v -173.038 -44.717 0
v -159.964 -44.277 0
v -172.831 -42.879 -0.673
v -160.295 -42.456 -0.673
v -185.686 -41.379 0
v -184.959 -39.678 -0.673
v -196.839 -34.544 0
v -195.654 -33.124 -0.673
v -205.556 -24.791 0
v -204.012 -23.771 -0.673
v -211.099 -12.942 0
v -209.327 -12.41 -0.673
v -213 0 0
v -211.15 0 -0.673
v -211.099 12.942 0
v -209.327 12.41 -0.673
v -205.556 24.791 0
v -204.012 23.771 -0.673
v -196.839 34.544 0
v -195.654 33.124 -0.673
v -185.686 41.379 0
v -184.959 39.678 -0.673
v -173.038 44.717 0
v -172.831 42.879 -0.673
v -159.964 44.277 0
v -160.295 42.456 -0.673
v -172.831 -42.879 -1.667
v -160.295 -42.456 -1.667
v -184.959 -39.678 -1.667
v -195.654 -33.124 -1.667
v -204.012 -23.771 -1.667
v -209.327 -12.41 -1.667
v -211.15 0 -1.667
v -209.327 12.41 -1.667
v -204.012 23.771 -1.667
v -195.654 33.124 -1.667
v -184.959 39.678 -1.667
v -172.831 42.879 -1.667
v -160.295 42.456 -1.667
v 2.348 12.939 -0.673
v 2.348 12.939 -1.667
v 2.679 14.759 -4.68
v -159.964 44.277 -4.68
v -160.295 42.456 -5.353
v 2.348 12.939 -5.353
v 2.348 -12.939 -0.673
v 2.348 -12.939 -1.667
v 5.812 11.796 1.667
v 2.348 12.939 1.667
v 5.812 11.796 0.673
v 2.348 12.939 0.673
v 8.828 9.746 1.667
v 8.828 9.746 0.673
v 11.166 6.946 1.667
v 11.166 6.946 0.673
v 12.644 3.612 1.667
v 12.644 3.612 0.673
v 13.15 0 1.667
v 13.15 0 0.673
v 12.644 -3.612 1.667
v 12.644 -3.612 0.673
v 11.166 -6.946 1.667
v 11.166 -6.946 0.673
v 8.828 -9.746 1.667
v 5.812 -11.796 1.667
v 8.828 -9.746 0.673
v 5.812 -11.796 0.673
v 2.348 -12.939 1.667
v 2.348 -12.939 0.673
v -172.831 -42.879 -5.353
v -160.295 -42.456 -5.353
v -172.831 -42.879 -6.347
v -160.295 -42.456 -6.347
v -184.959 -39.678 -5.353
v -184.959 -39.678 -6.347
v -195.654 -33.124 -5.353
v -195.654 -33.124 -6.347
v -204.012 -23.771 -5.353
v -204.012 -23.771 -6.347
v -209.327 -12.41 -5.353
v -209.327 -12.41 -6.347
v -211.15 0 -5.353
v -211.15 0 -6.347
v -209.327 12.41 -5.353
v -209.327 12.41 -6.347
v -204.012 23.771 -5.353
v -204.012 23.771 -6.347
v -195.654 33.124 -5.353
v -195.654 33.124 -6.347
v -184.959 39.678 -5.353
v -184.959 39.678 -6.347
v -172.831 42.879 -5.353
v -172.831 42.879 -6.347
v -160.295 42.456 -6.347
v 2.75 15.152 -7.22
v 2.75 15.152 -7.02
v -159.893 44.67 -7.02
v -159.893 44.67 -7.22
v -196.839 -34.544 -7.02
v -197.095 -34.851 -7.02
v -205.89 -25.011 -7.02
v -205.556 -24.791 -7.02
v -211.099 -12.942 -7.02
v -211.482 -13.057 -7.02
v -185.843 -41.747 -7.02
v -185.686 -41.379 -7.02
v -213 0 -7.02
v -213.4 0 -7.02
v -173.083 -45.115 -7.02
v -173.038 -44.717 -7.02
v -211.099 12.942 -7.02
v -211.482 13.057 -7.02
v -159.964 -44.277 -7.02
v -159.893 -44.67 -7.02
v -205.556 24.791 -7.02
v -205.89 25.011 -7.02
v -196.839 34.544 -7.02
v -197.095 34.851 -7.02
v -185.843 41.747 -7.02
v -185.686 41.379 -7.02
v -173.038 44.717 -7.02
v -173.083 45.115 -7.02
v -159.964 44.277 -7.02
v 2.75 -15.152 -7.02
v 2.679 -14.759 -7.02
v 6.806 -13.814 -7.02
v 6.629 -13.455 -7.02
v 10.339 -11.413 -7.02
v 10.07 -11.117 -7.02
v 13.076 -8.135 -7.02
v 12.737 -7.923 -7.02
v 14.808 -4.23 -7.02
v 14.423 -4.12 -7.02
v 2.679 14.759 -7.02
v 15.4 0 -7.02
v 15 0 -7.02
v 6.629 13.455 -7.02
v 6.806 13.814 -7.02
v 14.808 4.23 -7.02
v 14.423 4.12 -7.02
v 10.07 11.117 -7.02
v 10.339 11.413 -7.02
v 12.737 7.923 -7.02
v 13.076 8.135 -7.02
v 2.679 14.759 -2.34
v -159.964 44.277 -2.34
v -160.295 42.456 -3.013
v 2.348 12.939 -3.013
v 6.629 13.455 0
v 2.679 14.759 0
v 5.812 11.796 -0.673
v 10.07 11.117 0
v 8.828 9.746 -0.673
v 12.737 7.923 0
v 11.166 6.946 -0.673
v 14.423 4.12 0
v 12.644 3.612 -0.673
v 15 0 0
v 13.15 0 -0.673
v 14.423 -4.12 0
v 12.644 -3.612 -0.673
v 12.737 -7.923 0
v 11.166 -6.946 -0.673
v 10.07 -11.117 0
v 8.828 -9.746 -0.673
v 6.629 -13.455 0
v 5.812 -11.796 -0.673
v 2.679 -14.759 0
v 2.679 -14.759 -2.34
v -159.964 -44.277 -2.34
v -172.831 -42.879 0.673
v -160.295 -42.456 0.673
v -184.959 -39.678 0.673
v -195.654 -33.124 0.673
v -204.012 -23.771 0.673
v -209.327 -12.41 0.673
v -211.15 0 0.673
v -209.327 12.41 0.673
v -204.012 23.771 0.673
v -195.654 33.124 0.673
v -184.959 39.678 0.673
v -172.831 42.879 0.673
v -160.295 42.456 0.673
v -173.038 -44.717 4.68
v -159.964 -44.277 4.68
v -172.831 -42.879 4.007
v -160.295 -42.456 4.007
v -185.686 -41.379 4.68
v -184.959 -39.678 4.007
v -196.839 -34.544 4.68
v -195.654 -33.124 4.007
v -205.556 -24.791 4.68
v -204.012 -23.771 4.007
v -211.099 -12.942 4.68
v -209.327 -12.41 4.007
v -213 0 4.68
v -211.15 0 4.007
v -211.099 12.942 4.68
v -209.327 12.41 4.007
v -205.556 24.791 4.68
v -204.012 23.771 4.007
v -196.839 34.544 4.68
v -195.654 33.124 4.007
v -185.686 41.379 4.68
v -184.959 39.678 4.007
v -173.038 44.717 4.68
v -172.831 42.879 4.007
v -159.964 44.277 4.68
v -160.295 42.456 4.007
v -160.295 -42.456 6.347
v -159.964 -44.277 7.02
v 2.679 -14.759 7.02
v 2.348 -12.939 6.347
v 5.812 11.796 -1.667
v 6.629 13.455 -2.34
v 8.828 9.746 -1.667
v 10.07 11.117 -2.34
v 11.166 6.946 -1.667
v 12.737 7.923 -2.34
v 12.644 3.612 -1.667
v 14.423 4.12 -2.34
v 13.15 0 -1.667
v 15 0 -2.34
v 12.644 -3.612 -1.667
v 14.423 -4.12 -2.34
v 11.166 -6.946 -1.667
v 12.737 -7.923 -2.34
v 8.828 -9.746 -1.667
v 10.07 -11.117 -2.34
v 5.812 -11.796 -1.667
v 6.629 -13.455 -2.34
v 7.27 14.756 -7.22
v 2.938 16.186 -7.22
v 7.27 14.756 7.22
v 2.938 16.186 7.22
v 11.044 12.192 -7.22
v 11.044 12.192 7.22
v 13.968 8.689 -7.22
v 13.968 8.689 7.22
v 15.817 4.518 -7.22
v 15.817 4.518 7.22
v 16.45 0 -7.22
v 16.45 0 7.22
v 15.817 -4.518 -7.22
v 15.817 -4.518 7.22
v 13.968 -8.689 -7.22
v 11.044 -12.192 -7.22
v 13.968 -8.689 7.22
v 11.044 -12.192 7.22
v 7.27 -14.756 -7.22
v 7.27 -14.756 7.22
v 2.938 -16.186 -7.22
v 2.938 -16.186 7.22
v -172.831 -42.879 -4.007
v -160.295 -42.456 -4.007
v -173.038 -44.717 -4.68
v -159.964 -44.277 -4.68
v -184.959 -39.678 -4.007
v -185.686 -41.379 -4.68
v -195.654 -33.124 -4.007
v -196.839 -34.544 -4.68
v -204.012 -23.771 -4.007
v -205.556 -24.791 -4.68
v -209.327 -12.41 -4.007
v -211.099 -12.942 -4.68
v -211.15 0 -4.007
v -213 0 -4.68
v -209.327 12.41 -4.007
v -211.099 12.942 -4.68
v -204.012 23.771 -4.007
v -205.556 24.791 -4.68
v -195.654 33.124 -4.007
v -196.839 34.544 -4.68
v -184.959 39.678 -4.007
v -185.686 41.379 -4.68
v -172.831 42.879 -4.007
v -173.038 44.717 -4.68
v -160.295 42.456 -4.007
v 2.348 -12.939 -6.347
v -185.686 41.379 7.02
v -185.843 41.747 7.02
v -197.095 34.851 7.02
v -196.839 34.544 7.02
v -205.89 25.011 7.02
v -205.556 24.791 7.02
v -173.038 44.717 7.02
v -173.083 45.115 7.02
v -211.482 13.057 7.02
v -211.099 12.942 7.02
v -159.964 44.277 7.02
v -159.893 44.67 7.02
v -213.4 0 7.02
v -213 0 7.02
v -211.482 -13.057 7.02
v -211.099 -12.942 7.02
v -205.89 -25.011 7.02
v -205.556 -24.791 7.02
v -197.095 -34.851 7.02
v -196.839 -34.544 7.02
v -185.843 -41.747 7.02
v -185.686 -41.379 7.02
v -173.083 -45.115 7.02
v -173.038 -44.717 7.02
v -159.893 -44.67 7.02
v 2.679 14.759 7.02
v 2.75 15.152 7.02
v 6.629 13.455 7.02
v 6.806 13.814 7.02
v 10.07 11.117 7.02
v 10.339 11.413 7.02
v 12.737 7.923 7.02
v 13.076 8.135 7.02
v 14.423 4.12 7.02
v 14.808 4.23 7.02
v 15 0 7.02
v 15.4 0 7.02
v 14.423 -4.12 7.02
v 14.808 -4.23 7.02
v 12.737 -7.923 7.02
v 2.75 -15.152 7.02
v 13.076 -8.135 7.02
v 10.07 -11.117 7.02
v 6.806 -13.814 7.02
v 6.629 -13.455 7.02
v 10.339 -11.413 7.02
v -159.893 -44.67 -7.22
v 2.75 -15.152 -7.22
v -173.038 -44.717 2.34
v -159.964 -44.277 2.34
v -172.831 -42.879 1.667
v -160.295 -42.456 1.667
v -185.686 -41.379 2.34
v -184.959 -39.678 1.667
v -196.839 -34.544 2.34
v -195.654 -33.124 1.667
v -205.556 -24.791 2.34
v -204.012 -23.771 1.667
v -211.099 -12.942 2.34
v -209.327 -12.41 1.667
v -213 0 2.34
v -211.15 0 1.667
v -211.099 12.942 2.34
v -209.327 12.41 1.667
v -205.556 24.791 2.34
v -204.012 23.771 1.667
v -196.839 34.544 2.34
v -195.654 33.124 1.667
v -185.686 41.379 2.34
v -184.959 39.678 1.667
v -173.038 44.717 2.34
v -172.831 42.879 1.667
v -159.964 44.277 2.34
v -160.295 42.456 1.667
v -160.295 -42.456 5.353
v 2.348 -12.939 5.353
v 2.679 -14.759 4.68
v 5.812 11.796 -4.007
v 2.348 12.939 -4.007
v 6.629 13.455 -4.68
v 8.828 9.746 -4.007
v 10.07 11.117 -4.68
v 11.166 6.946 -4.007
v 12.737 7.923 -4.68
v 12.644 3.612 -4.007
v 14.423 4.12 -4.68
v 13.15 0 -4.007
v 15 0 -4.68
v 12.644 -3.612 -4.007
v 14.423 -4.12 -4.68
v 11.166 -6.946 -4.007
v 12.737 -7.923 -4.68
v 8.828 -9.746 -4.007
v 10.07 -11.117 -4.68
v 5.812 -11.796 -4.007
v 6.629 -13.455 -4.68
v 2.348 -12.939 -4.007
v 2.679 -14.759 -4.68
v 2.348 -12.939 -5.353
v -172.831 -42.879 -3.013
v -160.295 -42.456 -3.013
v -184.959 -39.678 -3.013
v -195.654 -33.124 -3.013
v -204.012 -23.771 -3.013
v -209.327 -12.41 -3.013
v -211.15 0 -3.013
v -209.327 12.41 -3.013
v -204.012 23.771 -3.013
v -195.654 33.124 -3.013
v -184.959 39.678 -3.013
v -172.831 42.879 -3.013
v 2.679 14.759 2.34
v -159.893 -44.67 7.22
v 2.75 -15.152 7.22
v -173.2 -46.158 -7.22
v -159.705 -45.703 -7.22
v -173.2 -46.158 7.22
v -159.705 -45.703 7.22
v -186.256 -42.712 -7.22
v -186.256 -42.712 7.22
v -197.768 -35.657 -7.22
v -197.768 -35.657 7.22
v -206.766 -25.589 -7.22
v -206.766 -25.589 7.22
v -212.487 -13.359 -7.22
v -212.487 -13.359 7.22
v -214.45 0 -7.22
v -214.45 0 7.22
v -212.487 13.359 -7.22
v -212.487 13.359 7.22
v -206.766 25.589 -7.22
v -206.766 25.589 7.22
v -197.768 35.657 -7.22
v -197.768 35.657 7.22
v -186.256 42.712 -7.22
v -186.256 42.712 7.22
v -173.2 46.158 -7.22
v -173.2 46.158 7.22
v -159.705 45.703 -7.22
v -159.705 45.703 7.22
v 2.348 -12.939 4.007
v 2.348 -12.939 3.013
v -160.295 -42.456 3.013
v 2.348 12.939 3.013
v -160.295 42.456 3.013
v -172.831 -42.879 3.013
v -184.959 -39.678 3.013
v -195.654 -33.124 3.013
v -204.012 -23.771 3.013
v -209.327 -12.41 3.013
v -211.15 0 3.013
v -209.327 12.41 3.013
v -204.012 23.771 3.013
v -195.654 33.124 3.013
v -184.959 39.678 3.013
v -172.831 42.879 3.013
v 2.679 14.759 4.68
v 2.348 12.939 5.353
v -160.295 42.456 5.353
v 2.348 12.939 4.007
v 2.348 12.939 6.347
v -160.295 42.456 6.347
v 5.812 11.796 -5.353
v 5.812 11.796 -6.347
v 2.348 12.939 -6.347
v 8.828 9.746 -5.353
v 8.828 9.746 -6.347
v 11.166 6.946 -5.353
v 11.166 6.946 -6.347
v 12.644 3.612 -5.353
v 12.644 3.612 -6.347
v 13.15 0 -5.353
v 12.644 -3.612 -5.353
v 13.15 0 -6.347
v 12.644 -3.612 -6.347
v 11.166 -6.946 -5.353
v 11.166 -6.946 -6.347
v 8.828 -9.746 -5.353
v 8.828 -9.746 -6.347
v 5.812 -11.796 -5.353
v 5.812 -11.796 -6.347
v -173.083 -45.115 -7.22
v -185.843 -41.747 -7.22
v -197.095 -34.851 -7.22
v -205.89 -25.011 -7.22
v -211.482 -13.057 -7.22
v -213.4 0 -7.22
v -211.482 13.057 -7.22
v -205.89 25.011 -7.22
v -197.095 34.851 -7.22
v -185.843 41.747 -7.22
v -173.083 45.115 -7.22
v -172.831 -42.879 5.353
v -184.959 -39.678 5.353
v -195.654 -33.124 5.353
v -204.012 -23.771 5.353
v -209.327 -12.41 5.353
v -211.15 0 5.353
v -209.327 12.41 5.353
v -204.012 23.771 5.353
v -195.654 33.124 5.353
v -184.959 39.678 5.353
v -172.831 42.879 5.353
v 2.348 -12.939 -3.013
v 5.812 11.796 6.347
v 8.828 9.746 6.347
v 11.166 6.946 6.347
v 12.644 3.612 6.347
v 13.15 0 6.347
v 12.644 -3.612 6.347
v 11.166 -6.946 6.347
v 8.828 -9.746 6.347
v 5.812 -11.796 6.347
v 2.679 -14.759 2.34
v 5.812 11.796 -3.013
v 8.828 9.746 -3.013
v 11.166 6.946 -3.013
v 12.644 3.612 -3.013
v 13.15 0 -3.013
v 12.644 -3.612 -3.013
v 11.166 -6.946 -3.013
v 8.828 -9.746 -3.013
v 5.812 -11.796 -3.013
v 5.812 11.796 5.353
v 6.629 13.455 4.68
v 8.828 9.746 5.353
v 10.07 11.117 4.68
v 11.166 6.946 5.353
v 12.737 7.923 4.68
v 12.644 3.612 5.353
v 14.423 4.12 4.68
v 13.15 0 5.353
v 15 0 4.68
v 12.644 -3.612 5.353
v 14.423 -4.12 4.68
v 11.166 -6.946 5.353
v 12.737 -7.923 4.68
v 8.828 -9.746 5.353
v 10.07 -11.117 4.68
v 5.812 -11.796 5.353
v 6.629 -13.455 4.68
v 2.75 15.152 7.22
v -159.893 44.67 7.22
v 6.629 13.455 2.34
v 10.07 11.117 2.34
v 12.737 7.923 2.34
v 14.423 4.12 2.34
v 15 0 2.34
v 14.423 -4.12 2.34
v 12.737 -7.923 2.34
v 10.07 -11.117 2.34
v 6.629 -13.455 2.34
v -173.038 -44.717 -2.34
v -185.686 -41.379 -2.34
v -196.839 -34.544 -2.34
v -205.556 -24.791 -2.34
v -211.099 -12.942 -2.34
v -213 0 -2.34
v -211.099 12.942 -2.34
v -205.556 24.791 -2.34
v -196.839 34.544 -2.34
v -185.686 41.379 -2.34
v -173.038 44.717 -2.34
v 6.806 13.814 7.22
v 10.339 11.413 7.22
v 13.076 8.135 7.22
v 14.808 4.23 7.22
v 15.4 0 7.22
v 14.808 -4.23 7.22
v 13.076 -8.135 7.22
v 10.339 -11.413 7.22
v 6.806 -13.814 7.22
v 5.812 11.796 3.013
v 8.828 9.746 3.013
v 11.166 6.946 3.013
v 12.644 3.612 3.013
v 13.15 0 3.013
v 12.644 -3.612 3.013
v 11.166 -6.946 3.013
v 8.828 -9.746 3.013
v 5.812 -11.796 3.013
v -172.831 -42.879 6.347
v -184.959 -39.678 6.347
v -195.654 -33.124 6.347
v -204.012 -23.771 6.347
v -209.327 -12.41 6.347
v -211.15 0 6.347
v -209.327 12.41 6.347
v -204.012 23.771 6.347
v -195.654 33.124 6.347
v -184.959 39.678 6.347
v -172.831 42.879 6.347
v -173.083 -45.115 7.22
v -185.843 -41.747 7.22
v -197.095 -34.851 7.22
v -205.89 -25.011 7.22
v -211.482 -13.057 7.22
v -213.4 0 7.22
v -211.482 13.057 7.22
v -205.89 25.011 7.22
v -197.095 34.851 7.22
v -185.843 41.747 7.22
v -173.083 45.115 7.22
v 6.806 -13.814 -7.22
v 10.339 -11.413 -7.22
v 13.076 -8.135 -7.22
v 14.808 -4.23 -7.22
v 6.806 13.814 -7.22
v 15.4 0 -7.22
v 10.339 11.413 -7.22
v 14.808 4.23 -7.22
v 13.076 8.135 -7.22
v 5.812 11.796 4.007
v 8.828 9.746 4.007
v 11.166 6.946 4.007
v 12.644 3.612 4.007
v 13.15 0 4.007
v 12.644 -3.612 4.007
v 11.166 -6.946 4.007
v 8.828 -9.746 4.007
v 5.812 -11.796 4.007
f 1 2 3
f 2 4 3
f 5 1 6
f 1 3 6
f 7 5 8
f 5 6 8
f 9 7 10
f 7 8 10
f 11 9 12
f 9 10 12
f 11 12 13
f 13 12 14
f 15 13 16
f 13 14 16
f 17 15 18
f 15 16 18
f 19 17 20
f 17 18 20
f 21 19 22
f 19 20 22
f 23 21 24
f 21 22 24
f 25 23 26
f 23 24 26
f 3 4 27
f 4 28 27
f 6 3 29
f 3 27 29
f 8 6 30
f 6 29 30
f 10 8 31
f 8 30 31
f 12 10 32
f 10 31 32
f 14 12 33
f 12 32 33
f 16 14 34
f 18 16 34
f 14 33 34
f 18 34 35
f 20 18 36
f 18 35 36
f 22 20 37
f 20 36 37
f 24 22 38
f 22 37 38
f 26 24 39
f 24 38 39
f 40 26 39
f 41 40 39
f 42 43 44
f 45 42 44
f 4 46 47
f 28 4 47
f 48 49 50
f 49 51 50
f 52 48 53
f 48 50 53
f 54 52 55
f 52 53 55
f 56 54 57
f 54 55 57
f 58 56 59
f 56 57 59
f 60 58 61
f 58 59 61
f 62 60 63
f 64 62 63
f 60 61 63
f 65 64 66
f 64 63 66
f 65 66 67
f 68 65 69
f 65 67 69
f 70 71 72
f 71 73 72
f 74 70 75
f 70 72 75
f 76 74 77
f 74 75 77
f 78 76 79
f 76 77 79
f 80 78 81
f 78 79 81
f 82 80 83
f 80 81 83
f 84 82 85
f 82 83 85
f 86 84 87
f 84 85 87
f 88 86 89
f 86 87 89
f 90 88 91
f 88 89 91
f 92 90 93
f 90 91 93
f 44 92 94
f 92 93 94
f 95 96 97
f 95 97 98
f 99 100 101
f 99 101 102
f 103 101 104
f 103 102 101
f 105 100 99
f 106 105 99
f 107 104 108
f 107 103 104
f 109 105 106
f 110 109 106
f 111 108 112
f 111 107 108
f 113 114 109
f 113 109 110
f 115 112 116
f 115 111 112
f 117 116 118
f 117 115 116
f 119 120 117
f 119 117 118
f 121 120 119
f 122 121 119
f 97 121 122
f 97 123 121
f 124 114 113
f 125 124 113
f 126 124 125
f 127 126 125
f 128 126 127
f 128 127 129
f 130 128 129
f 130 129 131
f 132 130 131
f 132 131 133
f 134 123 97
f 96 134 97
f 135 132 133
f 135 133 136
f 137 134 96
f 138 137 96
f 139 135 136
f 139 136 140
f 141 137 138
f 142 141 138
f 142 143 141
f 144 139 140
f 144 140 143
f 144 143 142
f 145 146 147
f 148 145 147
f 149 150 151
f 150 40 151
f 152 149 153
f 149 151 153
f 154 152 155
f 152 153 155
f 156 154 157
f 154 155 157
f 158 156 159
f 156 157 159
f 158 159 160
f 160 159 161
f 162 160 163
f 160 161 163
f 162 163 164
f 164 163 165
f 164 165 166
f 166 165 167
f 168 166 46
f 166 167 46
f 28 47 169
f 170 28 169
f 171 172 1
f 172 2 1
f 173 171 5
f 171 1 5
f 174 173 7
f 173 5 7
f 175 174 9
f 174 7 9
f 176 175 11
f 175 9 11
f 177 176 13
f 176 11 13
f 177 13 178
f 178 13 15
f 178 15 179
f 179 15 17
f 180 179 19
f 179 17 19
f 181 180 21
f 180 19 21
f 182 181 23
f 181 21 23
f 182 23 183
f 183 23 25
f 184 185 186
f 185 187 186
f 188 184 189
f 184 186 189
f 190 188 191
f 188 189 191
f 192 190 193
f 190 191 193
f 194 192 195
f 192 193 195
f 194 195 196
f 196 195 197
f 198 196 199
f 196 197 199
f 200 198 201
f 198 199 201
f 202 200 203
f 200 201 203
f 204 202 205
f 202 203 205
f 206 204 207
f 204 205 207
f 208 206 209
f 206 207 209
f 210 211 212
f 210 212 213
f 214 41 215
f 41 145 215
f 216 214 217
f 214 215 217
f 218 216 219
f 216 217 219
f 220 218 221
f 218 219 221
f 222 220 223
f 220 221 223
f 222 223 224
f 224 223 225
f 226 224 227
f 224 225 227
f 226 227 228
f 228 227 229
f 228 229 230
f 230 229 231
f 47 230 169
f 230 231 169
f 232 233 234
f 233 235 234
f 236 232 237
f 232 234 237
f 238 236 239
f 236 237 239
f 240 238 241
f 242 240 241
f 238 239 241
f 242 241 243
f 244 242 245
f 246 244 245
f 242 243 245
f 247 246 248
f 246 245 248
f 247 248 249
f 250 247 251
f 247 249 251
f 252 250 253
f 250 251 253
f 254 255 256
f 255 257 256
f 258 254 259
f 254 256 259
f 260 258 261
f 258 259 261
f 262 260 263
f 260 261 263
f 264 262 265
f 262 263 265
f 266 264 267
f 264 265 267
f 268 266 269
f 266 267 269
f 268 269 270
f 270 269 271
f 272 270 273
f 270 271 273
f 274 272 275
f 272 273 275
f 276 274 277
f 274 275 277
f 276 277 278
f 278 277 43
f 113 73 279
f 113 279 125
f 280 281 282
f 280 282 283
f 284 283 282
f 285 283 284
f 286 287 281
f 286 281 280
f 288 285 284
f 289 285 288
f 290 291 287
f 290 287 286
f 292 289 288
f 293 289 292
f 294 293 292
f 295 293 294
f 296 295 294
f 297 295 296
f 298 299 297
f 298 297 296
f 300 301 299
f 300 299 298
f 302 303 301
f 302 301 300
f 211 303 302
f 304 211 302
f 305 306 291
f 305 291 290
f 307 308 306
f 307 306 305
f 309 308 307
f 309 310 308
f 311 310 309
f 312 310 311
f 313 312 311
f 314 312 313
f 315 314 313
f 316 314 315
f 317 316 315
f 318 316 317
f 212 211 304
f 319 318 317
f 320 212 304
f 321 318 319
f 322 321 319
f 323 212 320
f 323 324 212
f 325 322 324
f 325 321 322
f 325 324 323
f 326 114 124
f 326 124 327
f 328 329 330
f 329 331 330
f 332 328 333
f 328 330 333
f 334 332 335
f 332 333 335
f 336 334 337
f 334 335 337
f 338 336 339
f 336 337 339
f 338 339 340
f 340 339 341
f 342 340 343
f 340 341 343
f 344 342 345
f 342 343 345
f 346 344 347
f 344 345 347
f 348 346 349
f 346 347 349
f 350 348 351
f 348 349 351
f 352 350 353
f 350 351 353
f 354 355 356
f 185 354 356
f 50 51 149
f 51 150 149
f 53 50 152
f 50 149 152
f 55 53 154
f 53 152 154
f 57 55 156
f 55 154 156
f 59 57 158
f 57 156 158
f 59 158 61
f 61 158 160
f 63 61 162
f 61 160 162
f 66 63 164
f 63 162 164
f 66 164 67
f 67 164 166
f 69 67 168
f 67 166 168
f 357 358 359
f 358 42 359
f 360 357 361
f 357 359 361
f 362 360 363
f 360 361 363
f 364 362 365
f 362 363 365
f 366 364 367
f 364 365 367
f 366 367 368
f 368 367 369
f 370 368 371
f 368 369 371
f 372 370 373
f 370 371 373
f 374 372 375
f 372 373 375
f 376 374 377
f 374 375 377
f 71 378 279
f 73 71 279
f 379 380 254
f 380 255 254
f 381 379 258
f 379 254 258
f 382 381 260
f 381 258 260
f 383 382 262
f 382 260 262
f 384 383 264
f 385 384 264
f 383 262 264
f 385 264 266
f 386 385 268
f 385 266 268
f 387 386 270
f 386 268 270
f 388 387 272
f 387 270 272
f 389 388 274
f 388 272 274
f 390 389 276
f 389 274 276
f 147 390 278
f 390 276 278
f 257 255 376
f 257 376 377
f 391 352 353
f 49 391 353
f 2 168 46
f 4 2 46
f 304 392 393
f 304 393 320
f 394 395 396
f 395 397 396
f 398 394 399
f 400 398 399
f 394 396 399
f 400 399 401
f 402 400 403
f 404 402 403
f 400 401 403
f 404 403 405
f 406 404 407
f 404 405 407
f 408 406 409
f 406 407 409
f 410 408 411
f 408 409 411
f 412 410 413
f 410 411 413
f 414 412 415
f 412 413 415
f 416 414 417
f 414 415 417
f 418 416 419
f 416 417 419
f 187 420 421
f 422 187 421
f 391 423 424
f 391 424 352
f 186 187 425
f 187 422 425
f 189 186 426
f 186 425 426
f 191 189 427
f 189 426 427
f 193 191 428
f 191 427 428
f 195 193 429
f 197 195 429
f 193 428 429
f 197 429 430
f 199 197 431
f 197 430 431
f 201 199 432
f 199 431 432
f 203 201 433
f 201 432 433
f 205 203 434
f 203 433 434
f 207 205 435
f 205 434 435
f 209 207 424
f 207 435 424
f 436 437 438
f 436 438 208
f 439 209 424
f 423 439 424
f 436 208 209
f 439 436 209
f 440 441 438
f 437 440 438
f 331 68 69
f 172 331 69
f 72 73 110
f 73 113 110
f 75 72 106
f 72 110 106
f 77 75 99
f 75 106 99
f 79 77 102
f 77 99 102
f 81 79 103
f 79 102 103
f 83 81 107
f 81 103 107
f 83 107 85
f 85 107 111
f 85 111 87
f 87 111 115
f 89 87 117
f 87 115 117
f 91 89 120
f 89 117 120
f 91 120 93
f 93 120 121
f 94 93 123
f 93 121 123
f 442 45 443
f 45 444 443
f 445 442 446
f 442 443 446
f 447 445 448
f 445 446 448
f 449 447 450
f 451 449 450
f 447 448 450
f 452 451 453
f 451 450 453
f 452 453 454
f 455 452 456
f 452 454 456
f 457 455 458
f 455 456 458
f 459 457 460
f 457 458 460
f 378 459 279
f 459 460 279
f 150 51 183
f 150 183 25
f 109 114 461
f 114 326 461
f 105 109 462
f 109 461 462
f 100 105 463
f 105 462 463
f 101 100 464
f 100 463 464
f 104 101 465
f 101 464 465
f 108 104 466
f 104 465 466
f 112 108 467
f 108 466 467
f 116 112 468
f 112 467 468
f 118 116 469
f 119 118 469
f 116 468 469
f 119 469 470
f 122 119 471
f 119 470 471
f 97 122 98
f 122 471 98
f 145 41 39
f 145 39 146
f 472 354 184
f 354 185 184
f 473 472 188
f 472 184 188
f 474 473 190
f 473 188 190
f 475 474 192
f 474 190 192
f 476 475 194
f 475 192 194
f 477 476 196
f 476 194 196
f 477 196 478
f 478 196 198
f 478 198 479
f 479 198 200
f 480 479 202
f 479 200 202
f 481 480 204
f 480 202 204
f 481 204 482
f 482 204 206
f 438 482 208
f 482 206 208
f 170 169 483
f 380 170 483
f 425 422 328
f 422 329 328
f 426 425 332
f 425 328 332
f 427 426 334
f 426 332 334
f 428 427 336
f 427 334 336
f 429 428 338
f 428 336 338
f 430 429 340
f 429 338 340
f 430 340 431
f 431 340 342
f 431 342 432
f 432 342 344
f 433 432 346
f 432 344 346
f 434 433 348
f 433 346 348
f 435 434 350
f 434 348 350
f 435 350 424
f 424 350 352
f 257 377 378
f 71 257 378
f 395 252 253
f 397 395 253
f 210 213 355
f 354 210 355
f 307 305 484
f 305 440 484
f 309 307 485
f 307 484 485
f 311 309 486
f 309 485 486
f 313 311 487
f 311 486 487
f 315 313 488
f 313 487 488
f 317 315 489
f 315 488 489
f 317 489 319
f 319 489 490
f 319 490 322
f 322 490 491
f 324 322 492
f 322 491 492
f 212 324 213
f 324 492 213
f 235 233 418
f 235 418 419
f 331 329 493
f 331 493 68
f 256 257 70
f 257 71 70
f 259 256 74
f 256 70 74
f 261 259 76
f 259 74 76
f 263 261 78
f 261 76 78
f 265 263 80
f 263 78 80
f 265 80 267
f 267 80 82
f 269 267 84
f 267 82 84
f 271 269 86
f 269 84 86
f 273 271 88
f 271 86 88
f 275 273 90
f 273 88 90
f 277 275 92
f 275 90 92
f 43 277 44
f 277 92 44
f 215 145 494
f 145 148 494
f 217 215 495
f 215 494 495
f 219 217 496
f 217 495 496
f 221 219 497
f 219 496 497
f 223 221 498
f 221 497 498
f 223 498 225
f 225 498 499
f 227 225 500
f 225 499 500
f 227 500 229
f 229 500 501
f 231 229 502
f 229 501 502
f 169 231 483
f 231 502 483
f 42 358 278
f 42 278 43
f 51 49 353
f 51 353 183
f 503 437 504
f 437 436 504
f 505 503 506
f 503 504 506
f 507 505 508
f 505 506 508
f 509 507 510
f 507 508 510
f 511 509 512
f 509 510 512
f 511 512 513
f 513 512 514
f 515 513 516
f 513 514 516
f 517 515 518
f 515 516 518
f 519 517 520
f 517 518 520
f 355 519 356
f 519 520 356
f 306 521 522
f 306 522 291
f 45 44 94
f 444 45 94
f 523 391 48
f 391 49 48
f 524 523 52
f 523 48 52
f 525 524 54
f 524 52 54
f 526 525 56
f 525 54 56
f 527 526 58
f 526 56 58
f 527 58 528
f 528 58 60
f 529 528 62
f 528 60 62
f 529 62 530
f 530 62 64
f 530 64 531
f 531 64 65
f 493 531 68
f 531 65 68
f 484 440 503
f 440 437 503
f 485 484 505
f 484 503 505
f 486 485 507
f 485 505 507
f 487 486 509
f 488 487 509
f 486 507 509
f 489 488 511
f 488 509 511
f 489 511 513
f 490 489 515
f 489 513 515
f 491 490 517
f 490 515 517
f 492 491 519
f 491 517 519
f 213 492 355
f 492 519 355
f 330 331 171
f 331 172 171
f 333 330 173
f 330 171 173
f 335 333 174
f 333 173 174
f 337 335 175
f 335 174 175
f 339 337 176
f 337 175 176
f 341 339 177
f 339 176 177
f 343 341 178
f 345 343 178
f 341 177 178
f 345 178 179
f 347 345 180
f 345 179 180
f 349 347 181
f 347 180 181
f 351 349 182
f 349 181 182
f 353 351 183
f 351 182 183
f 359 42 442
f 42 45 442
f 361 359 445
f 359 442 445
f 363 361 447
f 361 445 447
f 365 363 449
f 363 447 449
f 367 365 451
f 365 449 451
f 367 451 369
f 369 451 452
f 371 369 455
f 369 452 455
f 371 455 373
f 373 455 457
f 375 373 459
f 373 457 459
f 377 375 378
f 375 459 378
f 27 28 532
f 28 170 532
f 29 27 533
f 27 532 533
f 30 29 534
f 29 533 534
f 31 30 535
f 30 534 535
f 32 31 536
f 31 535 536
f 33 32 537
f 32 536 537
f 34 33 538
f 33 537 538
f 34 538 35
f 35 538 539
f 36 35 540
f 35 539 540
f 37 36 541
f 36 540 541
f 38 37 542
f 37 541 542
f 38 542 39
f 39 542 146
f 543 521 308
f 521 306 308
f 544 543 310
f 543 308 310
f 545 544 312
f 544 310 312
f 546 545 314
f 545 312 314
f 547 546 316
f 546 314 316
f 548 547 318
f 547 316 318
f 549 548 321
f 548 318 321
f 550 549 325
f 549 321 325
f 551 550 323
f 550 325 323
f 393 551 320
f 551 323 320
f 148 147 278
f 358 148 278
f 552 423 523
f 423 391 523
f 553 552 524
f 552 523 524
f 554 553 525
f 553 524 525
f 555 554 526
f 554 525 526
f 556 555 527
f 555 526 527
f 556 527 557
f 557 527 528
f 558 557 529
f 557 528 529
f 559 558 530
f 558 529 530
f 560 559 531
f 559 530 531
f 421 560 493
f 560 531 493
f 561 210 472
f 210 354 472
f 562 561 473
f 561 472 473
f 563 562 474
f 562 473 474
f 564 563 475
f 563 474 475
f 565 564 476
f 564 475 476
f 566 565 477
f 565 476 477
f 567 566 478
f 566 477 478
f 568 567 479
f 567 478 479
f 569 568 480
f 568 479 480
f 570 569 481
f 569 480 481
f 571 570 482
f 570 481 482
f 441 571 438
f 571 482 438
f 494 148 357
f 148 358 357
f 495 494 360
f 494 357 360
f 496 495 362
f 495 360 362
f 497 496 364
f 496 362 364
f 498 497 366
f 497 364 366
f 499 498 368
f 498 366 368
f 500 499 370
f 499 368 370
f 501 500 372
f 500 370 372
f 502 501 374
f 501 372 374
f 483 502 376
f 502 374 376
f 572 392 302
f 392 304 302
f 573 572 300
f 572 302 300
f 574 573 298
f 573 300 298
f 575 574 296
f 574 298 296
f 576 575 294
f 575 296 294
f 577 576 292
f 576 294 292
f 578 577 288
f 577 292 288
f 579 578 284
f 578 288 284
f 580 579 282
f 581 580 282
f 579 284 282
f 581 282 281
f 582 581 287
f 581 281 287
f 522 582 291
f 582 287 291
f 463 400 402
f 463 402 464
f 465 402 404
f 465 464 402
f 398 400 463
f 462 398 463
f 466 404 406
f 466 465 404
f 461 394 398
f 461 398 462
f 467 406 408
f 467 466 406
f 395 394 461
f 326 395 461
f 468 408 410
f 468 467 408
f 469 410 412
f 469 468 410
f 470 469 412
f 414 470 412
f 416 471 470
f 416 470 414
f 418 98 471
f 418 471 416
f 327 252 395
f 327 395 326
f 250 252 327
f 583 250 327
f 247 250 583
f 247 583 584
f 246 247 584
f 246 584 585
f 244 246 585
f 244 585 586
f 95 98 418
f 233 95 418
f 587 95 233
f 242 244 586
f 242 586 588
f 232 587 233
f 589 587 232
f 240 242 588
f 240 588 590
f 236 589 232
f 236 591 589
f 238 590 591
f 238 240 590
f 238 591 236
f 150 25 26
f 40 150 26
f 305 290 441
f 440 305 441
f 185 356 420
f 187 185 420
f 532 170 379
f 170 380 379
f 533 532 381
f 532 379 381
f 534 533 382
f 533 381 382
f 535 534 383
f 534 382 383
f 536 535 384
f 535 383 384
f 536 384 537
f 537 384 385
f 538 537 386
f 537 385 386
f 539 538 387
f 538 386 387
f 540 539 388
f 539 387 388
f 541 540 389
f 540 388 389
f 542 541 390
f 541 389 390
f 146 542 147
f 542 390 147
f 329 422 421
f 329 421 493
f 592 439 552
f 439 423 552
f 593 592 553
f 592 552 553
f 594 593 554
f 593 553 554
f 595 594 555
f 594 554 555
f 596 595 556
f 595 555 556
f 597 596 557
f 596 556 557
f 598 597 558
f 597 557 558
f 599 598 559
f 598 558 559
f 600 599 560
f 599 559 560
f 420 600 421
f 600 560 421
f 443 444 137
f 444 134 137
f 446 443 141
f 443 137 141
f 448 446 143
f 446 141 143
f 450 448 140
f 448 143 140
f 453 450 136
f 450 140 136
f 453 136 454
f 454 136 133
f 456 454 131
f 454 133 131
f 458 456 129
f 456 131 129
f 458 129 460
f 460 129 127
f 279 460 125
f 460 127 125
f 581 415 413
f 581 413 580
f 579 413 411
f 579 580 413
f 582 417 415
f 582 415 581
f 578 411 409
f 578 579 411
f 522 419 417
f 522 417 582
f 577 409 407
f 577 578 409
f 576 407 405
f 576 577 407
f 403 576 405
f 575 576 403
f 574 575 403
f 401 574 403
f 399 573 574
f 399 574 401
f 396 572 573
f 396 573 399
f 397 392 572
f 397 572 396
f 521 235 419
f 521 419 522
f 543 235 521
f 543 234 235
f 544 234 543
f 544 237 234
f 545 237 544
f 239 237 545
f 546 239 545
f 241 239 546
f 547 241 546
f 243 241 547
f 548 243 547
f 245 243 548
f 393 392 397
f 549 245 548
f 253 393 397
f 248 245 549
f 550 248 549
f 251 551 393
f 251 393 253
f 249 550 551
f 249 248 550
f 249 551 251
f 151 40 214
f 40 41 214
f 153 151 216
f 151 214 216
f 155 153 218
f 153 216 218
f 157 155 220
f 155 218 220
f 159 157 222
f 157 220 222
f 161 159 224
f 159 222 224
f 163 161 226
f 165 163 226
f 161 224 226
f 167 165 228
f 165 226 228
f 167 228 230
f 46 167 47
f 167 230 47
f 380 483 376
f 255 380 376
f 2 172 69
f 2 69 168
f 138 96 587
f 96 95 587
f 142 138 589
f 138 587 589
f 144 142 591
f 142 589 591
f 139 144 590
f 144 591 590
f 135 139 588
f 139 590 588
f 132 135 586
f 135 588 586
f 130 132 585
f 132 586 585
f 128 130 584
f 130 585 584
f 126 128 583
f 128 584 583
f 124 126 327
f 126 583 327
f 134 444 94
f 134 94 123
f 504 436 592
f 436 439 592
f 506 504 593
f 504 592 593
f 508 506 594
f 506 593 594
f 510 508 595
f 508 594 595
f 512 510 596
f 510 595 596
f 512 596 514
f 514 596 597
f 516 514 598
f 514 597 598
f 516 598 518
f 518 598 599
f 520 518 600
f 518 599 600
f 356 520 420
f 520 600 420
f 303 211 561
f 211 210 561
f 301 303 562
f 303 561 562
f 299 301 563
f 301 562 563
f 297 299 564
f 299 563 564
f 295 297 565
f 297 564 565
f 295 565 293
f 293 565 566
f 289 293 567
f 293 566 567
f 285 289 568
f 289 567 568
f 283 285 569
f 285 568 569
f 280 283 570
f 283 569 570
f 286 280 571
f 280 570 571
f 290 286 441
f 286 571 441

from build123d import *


with BuildPart() as part:
    # По траектории1: sweep along a path in Эскиз1
    with BuildLine(Plane.XY) as sweep_1_path:
        Line((-159.964285714, 44.276712795), (2.678571429, 14.758904265))
        ThreePointArc((2.678571429, 14.758904265), (15, 0), (2.678571429, -14.758904265))
        Line((2.678571429, -14.758904265), (-159.964285714, -44.276712795))
        ThreePointArc((-159.964285714, -44.276712795), (-213, 0), (-159.964285714, 44.276712795))
    # Эскиз2 → По траектории1 (sweep)
    with BuildSketch(Plane(origin=(0, 0, 0), x_dir=(1, 0, 0), z_dir=(0, 1, 0))):
        Polygon((-213, 0), (-211.15, 0.673344933), (-211.15, 1.666655067), (-213, 2.34), (-211.15, 3.013344933), (-211.15, 4.006655067), (-213, 4.68), (-211.15, 5.353344933), (-211.15, 6.346655067), (-213, 7.02), (-213.4, 7.02), (-213.4, 7.22), (-214.45, 7.22), (-214.45, -7.22), (-213.4, -7.22), (-213.4, -7.02), (-213, -7.02), (-211.15, -6.346655067), (-211.15, -5.353344933), (-213, -4.68), (-211.15, -4.006655067), (-211.15, -3.013344933), (-213, -2.34), (-211.15, -1.666655067), (-211.15, -0.673344933), align=None)
    sweep(path=sweep_1_path.line)


solid = part.part
